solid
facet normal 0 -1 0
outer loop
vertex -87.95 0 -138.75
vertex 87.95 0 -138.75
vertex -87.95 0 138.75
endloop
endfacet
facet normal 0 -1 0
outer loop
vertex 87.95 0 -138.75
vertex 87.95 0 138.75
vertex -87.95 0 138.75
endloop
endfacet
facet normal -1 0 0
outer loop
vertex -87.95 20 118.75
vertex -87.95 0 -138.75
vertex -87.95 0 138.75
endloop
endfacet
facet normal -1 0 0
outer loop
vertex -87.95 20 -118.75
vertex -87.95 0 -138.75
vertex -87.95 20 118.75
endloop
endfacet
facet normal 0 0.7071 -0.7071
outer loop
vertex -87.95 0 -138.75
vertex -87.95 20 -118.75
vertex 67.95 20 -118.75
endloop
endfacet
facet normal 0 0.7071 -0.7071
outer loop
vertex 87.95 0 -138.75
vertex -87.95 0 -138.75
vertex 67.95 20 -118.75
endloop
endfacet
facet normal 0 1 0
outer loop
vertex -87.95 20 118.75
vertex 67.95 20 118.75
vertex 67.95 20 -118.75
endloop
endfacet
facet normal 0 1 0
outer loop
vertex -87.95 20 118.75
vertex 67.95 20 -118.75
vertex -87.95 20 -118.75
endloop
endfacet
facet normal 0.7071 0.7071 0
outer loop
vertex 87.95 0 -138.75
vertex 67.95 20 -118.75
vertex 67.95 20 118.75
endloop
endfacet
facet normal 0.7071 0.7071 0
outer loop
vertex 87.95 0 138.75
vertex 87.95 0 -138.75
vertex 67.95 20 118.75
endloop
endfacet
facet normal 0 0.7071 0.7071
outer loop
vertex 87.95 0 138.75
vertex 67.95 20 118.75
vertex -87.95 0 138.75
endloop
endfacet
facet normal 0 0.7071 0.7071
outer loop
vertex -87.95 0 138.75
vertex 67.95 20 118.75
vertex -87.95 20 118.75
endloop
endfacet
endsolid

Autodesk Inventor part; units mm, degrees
ref_plane "YZ Plane" through (0, 0, 0) normal (1, 0, 0) x (0, 1, 0)
ref_plane "XZ Plane" through (0, 0, 0) normal (0, 1, 0) x (-1, 0, 0)
ref_plane "XY Plane" through (0, 0, 0) normal (0, 0, 1) x (1, 0, 0)
sketch "Sketch1" plane through (0, 0, 0) normal (0, 1, 0) x (-1, 0, 0)
  line L0 (87.95, 138.75) -> (-87.95, 138.75)
  line L1 (-87.95, 138.75) -> (-87.95, -138.75)
  line L2 (-87.95, -138.75) -> (87.95, -138.75)
  line L3 (87.95, -138.75) -> (87.95, 138.75)
  line L4 (87.95, 138.75) -> (-87.95, -138.75) construction
  line L5 (-87.95, 138.75) -> (87.95, -138.75) construction
  point P0 (0, 0)
  dimension "d0" = 175.9
  dimension "d1" = 277.5
extrude "Extrusion1" add sketch "Sketch1" along normal blind 20
chamfer "Chamfer3" distance 20 angle 45 3 edges at (0, 20, 138.75) (0, 20, -138.75) (87.95, 20, 0)
